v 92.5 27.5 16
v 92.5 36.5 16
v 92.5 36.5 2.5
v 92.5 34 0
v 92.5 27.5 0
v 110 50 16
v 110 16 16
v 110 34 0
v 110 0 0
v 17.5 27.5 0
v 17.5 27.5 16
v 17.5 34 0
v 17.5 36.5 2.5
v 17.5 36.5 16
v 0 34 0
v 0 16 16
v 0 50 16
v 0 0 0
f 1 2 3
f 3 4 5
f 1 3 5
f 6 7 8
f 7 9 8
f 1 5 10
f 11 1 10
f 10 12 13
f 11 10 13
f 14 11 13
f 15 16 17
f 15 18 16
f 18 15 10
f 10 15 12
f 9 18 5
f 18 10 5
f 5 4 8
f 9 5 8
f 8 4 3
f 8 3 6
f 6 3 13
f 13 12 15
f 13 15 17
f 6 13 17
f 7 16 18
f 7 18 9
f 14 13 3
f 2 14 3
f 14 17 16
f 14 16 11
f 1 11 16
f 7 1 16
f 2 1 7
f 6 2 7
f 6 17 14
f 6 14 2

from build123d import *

# Parameters (mm, degrees)
F0_W        = 110
F0_H        = 50
F1_DEPTH    = 16
F2_SIZE     = 15.99999
F3_T1_DEPTH = 192.2938556149


# Not quite as in the source:
# - a fillet or chamfer that OpenCascade refuses, or shapes differently, is made with other operations: its cross-section is extruded or revolved along the edge and cut away or added
# - a fillet or chamfer is up to 0.001 mm smaller than in the source, because OpenCascade refuses the exact size


with BuildPart() as f1:
    # F0 (on Top) → F1 (new body)
    with BuildSketch(Plane.XY):
        with Locations((55, 25)):
            Rectangle(F0_W, F0_H)
        Polygon((17.5, 36.5), (55, 36.5), (92.5, 36.5), (92.5, 27.5), (17.5, 27.5), align=None, mode=Mode.SUBTRACT)
    extrude(amount=F1_DEPTH)

    # F2 (size 16 in the source; OpenCascade refuses exactly that, so slightly less here)
    f2_edges = [f1.edges().sort_by_distance(p)[0] for p in [
        (55, 0, 16),
    ]]
    chamfer(f2_edges, length=F2_SIZE)

    # F3: chamfer of 16 on 1 edges, made by hand

    # F3_s2 → F3_t1 (cut)
    with BuildSketch(Plane.YZ.offset(-41.1469278075)):
        Polygon((34, 0), (50, 16), (50, 0), align=None)
    extrude(amount=F3_T1_DEPTH, mode=Mode.SUBTRACT)


solid = f1.part
